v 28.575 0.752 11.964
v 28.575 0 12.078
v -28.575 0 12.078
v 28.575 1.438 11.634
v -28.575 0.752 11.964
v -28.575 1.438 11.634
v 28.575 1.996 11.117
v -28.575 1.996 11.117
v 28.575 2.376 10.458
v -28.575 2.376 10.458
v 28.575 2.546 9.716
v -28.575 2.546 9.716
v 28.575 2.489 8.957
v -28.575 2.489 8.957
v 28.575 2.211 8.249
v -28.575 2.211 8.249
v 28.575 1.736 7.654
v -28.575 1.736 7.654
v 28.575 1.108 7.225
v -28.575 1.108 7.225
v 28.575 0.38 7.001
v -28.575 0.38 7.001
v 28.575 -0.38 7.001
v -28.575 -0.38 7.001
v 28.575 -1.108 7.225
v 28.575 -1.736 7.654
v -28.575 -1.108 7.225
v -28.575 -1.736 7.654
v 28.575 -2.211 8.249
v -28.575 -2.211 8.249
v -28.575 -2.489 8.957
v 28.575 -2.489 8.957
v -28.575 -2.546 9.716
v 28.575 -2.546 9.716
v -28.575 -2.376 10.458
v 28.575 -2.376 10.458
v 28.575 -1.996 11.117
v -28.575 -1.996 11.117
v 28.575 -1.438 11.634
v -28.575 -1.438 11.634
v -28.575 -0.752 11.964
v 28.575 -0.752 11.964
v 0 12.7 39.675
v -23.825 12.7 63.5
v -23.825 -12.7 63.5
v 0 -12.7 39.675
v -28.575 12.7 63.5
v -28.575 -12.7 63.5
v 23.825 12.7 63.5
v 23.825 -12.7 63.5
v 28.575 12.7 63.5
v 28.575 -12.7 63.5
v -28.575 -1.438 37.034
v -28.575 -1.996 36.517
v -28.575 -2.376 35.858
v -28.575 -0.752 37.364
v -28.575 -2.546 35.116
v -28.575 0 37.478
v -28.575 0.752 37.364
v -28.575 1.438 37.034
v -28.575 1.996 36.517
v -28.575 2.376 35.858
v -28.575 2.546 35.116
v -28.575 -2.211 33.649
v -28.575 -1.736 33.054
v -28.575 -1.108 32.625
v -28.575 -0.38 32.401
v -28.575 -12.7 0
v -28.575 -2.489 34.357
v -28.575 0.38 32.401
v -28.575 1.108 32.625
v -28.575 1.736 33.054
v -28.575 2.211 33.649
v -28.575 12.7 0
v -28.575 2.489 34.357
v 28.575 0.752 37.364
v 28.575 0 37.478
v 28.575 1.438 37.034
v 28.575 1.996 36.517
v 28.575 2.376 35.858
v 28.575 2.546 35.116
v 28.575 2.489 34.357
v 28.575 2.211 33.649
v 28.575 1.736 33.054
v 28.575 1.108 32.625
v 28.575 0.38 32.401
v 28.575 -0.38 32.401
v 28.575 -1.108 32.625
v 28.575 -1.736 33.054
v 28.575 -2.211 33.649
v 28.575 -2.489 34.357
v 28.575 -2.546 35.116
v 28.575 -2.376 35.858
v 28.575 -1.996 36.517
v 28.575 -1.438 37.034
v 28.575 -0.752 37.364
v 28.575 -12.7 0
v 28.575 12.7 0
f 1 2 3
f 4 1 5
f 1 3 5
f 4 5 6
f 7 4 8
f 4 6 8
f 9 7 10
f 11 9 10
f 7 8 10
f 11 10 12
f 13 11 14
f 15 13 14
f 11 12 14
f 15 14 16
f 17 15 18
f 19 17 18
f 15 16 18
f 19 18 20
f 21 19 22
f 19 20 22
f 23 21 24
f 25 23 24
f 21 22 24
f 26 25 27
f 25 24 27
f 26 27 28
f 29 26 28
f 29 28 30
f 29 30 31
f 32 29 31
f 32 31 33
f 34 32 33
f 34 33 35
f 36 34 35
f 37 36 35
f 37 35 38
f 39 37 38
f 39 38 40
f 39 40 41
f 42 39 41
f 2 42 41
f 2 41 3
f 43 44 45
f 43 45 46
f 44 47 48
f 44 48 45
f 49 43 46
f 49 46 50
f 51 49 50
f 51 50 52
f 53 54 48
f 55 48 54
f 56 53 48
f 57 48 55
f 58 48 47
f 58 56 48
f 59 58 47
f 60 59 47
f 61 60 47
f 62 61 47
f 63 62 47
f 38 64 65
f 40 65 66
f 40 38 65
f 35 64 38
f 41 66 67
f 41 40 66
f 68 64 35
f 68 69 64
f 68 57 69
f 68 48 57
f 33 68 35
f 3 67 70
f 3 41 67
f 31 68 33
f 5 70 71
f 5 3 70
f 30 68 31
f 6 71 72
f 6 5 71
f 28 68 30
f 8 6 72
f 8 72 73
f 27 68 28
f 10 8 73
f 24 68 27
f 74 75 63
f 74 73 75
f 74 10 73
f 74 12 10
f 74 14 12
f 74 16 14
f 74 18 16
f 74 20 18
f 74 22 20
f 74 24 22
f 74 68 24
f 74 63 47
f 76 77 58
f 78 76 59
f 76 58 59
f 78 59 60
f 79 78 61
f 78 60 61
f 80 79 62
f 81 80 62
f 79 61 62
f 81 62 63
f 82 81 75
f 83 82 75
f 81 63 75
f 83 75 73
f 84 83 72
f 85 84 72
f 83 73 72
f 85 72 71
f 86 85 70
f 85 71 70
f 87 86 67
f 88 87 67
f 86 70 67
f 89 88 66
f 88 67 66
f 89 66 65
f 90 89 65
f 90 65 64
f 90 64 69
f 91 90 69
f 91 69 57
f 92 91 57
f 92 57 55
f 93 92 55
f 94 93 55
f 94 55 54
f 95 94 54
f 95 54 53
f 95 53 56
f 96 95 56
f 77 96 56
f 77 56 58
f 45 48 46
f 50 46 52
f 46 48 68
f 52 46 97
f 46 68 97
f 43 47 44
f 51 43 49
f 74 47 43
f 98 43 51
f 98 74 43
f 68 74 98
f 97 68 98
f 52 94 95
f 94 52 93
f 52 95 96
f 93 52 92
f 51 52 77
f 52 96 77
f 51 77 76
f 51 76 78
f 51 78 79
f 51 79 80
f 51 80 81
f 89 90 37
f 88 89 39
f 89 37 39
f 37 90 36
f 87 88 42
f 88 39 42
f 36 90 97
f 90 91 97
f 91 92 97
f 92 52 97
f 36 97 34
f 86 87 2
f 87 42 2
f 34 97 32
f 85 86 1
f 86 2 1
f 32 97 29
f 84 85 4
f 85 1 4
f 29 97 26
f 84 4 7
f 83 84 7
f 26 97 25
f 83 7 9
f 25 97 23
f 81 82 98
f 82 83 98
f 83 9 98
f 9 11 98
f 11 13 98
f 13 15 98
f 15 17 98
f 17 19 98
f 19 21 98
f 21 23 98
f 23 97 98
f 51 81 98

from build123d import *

# Parameters (mm, degrees)
SKETCH1_W               = 57.15
SKETCH1_H               = 25.4
BOSS_EXTRUDE1_DEPTH     = 63.5
F_1_4_20_TAPPED_HOLE1_D = 5.1054
CUT_EXTRUDE1_DEPTH      = 75.121121315


with BuildPart() as part:
    # Sketch1 → Boss-Extrude1 (new body)
    with BuildSketch(Plane.XY):
        Rectangle(SKETCH1_W, SKETCH1_H)
    extrude(amount=BOSS_EXTRUDE1_DEPTH)

    # 1/4-20 Tapped Hole1 (through all)
    with Locations(Plane(origin=(28.575, 0, 0), x_dir=(0, 0, -1), z_dir=(1, 0, 0))):
        with Locations((-34.925, 0), (-9.525, 0)):
            Hole(F_1_4_20_TAPPED_HOLE1_D / 2)

    # Sketch5 → Cut-Extrude1 (cut, through all)
    with BuildSketch(Plane(origin=(0, 12.7, 0), x_dir=(1, 0, 0), z_dir=(0, 1, 0))):
        Polygon((-23.8252, -63.5), (0, -39.6748), (23.8252, -63.5), align=None)
    extrude(amount=-CUT_EXTRUDE1_DEPTH, mode=Mode.SUBTRACT)


solid = part.part
